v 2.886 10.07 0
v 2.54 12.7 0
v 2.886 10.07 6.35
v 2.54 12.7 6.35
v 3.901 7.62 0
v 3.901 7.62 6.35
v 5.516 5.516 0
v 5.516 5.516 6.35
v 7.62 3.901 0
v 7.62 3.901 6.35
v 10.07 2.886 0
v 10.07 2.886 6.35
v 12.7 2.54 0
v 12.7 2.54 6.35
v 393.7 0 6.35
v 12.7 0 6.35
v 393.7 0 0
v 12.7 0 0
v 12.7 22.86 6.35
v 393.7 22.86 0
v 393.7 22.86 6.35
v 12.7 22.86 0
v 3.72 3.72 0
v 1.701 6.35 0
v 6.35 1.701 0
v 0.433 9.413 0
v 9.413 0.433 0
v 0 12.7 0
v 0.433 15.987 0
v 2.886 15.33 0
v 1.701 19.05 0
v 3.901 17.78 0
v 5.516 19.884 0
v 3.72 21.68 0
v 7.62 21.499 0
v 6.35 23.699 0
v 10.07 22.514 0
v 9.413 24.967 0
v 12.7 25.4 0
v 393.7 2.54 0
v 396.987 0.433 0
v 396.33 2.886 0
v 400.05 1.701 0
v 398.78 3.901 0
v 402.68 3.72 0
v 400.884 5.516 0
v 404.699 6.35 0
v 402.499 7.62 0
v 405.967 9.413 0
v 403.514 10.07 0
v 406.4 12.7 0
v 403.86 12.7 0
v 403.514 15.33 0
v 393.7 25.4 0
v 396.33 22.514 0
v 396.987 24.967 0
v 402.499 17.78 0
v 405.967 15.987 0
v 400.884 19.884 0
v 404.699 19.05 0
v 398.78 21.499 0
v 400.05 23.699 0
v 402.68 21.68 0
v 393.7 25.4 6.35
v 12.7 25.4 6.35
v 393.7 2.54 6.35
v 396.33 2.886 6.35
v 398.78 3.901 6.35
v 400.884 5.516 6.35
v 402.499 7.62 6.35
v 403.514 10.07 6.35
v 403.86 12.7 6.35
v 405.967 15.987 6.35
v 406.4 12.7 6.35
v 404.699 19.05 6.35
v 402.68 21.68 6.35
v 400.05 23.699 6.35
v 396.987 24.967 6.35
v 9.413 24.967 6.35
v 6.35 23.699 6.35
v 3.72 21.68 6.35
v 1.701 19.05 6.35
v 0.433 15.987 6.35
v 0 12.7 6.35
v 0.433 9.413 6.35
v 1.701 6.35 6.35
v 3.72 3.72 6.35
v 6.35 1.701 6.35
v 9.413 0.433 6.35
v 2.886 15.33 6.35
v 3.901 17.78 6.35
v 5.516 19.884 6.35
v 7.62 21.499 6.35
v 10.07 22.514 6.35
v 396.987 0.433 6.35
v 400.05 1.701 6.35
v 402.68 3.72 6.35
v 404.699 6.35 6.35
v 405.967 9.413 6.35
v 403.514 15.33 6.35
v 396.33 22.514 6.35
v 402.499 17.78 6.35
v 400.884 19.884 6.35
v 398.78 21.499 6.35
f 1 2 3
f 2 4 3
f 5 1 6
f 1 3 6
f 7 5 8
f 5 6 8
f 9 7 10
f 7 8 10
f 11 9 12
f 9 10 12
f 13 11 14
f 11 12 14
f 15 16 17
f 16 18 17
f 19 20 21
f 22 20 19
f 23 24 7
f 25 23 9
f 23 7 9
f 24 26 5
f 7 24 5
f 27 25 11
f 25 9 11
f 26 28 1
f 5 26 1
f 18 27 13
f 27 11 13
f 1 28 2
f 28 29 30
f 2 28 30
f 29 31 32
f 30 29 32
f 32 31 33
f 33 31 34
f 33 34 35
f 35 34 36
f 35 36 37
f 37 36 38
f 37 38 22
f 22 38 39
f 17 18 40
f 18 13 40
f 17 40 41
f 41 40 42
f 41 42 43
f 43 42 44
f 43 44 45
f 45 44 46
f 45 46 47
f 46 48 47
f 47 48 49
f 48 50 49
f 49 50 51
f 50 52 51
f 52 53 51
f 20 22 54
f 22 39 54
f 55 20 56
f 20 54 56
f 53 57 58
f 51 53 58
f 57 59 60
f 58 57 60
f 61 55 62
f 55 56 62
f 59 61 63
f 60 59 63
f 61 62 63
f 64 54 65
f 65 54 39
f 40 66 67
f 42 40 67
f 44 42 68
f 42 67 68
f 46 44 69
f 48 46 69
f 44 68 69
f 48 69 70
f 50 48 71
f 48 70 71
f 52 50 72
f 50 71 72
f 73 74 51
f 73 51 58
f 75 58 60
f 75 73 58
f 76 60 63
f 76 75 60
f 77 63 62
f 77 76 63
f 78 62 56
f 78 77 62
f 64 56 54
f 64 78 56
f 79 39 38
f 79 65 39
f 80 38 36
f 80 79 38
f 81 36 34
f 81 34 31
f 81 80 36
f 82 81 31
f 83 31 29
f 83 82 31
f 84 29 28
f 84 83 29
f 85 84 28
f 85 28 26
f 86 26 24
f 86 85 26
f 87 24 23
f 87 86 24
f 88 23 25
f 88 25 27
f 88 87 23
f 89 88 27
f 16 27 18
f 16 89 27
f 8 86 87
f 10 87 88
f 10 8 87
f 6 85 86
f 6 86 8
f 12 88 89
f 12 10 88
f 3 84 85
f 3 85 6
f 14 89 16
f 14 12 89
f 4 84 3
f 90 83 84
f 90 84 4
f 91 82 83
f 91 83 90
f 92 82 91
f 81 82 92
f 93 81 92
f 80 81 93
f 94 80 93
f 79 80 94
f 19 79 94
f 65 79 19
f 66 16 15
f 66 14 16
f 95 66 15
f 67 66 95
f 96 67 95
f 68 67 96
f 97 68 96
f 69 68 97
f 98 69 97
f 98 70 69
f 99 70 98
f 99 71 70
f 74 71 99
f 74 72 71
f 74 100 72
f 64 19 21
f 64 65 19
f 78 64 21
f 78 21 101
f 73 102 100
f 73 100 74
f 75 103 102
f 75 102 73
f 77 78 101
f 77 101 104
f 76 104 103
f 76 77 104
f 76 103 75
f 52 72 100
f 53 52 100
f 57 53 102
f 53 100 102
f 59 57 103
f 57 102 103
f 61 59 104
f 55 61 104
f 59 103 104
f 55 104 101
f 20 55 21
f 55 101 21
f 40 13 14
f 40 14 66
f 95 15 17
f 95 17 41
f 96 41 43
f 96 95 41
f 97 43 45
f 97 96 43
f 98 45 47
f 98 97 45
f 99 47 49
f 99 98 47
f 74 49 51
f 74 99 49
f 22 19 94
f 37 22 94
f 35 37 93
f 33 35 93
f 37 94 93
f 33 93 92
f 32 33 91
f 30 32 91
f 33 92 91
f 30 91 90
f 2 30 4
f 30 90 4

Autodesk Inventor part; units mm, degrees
ref_plane "YZ Plane" through (0, 0, 0) normal (1, 0, 0) x (0, 1, 0)
ref_plane "XZ Plane" through (0, 0, 0) normal (0, 1, 0) x (-1, 0, 0)
ref_plane "XY Plane" through (0, 0, 0) normal (0, 0, 1) x (1, 0, 0)
sketch "Sketch1" plane through (0, 0, 0) normal (0, 0, 1) x (1, 0, 0)
  line L0 (0, 0) -> (406.4, 0)
  line L1 (406.4, 0) -> (406.4, 25.4)
  line L2 (406.4, 25.4) -> (0, 25.4)
  line L3 (0, 25.4) -> (0, 0)
  dimension "d0" = 406.4
  dimension "d1" = 25.4
extrude "Extrusion1" add sketch "Sketch1" along normal blind 6.35
fillet "Fillet1" radius 12.7 1 edges at (406.4, 25.4, 3.175)
fillet "Fillet2" radius 12.7 1 edges at (406.4, 0, 3.175)
fillet "Fillet3" radius 12.7 1 edges at (0, 25.4, 3.175)
fillet "Fillet4" radius 12.7 1 edges at (0, 0, 3.175)
shell "Shell1" thickness 2.54 removed faces 2 at (266.7, 8.4667, 6.35) at (266.7, 8.4667, 0)
properties part number "16inchliftwire"
